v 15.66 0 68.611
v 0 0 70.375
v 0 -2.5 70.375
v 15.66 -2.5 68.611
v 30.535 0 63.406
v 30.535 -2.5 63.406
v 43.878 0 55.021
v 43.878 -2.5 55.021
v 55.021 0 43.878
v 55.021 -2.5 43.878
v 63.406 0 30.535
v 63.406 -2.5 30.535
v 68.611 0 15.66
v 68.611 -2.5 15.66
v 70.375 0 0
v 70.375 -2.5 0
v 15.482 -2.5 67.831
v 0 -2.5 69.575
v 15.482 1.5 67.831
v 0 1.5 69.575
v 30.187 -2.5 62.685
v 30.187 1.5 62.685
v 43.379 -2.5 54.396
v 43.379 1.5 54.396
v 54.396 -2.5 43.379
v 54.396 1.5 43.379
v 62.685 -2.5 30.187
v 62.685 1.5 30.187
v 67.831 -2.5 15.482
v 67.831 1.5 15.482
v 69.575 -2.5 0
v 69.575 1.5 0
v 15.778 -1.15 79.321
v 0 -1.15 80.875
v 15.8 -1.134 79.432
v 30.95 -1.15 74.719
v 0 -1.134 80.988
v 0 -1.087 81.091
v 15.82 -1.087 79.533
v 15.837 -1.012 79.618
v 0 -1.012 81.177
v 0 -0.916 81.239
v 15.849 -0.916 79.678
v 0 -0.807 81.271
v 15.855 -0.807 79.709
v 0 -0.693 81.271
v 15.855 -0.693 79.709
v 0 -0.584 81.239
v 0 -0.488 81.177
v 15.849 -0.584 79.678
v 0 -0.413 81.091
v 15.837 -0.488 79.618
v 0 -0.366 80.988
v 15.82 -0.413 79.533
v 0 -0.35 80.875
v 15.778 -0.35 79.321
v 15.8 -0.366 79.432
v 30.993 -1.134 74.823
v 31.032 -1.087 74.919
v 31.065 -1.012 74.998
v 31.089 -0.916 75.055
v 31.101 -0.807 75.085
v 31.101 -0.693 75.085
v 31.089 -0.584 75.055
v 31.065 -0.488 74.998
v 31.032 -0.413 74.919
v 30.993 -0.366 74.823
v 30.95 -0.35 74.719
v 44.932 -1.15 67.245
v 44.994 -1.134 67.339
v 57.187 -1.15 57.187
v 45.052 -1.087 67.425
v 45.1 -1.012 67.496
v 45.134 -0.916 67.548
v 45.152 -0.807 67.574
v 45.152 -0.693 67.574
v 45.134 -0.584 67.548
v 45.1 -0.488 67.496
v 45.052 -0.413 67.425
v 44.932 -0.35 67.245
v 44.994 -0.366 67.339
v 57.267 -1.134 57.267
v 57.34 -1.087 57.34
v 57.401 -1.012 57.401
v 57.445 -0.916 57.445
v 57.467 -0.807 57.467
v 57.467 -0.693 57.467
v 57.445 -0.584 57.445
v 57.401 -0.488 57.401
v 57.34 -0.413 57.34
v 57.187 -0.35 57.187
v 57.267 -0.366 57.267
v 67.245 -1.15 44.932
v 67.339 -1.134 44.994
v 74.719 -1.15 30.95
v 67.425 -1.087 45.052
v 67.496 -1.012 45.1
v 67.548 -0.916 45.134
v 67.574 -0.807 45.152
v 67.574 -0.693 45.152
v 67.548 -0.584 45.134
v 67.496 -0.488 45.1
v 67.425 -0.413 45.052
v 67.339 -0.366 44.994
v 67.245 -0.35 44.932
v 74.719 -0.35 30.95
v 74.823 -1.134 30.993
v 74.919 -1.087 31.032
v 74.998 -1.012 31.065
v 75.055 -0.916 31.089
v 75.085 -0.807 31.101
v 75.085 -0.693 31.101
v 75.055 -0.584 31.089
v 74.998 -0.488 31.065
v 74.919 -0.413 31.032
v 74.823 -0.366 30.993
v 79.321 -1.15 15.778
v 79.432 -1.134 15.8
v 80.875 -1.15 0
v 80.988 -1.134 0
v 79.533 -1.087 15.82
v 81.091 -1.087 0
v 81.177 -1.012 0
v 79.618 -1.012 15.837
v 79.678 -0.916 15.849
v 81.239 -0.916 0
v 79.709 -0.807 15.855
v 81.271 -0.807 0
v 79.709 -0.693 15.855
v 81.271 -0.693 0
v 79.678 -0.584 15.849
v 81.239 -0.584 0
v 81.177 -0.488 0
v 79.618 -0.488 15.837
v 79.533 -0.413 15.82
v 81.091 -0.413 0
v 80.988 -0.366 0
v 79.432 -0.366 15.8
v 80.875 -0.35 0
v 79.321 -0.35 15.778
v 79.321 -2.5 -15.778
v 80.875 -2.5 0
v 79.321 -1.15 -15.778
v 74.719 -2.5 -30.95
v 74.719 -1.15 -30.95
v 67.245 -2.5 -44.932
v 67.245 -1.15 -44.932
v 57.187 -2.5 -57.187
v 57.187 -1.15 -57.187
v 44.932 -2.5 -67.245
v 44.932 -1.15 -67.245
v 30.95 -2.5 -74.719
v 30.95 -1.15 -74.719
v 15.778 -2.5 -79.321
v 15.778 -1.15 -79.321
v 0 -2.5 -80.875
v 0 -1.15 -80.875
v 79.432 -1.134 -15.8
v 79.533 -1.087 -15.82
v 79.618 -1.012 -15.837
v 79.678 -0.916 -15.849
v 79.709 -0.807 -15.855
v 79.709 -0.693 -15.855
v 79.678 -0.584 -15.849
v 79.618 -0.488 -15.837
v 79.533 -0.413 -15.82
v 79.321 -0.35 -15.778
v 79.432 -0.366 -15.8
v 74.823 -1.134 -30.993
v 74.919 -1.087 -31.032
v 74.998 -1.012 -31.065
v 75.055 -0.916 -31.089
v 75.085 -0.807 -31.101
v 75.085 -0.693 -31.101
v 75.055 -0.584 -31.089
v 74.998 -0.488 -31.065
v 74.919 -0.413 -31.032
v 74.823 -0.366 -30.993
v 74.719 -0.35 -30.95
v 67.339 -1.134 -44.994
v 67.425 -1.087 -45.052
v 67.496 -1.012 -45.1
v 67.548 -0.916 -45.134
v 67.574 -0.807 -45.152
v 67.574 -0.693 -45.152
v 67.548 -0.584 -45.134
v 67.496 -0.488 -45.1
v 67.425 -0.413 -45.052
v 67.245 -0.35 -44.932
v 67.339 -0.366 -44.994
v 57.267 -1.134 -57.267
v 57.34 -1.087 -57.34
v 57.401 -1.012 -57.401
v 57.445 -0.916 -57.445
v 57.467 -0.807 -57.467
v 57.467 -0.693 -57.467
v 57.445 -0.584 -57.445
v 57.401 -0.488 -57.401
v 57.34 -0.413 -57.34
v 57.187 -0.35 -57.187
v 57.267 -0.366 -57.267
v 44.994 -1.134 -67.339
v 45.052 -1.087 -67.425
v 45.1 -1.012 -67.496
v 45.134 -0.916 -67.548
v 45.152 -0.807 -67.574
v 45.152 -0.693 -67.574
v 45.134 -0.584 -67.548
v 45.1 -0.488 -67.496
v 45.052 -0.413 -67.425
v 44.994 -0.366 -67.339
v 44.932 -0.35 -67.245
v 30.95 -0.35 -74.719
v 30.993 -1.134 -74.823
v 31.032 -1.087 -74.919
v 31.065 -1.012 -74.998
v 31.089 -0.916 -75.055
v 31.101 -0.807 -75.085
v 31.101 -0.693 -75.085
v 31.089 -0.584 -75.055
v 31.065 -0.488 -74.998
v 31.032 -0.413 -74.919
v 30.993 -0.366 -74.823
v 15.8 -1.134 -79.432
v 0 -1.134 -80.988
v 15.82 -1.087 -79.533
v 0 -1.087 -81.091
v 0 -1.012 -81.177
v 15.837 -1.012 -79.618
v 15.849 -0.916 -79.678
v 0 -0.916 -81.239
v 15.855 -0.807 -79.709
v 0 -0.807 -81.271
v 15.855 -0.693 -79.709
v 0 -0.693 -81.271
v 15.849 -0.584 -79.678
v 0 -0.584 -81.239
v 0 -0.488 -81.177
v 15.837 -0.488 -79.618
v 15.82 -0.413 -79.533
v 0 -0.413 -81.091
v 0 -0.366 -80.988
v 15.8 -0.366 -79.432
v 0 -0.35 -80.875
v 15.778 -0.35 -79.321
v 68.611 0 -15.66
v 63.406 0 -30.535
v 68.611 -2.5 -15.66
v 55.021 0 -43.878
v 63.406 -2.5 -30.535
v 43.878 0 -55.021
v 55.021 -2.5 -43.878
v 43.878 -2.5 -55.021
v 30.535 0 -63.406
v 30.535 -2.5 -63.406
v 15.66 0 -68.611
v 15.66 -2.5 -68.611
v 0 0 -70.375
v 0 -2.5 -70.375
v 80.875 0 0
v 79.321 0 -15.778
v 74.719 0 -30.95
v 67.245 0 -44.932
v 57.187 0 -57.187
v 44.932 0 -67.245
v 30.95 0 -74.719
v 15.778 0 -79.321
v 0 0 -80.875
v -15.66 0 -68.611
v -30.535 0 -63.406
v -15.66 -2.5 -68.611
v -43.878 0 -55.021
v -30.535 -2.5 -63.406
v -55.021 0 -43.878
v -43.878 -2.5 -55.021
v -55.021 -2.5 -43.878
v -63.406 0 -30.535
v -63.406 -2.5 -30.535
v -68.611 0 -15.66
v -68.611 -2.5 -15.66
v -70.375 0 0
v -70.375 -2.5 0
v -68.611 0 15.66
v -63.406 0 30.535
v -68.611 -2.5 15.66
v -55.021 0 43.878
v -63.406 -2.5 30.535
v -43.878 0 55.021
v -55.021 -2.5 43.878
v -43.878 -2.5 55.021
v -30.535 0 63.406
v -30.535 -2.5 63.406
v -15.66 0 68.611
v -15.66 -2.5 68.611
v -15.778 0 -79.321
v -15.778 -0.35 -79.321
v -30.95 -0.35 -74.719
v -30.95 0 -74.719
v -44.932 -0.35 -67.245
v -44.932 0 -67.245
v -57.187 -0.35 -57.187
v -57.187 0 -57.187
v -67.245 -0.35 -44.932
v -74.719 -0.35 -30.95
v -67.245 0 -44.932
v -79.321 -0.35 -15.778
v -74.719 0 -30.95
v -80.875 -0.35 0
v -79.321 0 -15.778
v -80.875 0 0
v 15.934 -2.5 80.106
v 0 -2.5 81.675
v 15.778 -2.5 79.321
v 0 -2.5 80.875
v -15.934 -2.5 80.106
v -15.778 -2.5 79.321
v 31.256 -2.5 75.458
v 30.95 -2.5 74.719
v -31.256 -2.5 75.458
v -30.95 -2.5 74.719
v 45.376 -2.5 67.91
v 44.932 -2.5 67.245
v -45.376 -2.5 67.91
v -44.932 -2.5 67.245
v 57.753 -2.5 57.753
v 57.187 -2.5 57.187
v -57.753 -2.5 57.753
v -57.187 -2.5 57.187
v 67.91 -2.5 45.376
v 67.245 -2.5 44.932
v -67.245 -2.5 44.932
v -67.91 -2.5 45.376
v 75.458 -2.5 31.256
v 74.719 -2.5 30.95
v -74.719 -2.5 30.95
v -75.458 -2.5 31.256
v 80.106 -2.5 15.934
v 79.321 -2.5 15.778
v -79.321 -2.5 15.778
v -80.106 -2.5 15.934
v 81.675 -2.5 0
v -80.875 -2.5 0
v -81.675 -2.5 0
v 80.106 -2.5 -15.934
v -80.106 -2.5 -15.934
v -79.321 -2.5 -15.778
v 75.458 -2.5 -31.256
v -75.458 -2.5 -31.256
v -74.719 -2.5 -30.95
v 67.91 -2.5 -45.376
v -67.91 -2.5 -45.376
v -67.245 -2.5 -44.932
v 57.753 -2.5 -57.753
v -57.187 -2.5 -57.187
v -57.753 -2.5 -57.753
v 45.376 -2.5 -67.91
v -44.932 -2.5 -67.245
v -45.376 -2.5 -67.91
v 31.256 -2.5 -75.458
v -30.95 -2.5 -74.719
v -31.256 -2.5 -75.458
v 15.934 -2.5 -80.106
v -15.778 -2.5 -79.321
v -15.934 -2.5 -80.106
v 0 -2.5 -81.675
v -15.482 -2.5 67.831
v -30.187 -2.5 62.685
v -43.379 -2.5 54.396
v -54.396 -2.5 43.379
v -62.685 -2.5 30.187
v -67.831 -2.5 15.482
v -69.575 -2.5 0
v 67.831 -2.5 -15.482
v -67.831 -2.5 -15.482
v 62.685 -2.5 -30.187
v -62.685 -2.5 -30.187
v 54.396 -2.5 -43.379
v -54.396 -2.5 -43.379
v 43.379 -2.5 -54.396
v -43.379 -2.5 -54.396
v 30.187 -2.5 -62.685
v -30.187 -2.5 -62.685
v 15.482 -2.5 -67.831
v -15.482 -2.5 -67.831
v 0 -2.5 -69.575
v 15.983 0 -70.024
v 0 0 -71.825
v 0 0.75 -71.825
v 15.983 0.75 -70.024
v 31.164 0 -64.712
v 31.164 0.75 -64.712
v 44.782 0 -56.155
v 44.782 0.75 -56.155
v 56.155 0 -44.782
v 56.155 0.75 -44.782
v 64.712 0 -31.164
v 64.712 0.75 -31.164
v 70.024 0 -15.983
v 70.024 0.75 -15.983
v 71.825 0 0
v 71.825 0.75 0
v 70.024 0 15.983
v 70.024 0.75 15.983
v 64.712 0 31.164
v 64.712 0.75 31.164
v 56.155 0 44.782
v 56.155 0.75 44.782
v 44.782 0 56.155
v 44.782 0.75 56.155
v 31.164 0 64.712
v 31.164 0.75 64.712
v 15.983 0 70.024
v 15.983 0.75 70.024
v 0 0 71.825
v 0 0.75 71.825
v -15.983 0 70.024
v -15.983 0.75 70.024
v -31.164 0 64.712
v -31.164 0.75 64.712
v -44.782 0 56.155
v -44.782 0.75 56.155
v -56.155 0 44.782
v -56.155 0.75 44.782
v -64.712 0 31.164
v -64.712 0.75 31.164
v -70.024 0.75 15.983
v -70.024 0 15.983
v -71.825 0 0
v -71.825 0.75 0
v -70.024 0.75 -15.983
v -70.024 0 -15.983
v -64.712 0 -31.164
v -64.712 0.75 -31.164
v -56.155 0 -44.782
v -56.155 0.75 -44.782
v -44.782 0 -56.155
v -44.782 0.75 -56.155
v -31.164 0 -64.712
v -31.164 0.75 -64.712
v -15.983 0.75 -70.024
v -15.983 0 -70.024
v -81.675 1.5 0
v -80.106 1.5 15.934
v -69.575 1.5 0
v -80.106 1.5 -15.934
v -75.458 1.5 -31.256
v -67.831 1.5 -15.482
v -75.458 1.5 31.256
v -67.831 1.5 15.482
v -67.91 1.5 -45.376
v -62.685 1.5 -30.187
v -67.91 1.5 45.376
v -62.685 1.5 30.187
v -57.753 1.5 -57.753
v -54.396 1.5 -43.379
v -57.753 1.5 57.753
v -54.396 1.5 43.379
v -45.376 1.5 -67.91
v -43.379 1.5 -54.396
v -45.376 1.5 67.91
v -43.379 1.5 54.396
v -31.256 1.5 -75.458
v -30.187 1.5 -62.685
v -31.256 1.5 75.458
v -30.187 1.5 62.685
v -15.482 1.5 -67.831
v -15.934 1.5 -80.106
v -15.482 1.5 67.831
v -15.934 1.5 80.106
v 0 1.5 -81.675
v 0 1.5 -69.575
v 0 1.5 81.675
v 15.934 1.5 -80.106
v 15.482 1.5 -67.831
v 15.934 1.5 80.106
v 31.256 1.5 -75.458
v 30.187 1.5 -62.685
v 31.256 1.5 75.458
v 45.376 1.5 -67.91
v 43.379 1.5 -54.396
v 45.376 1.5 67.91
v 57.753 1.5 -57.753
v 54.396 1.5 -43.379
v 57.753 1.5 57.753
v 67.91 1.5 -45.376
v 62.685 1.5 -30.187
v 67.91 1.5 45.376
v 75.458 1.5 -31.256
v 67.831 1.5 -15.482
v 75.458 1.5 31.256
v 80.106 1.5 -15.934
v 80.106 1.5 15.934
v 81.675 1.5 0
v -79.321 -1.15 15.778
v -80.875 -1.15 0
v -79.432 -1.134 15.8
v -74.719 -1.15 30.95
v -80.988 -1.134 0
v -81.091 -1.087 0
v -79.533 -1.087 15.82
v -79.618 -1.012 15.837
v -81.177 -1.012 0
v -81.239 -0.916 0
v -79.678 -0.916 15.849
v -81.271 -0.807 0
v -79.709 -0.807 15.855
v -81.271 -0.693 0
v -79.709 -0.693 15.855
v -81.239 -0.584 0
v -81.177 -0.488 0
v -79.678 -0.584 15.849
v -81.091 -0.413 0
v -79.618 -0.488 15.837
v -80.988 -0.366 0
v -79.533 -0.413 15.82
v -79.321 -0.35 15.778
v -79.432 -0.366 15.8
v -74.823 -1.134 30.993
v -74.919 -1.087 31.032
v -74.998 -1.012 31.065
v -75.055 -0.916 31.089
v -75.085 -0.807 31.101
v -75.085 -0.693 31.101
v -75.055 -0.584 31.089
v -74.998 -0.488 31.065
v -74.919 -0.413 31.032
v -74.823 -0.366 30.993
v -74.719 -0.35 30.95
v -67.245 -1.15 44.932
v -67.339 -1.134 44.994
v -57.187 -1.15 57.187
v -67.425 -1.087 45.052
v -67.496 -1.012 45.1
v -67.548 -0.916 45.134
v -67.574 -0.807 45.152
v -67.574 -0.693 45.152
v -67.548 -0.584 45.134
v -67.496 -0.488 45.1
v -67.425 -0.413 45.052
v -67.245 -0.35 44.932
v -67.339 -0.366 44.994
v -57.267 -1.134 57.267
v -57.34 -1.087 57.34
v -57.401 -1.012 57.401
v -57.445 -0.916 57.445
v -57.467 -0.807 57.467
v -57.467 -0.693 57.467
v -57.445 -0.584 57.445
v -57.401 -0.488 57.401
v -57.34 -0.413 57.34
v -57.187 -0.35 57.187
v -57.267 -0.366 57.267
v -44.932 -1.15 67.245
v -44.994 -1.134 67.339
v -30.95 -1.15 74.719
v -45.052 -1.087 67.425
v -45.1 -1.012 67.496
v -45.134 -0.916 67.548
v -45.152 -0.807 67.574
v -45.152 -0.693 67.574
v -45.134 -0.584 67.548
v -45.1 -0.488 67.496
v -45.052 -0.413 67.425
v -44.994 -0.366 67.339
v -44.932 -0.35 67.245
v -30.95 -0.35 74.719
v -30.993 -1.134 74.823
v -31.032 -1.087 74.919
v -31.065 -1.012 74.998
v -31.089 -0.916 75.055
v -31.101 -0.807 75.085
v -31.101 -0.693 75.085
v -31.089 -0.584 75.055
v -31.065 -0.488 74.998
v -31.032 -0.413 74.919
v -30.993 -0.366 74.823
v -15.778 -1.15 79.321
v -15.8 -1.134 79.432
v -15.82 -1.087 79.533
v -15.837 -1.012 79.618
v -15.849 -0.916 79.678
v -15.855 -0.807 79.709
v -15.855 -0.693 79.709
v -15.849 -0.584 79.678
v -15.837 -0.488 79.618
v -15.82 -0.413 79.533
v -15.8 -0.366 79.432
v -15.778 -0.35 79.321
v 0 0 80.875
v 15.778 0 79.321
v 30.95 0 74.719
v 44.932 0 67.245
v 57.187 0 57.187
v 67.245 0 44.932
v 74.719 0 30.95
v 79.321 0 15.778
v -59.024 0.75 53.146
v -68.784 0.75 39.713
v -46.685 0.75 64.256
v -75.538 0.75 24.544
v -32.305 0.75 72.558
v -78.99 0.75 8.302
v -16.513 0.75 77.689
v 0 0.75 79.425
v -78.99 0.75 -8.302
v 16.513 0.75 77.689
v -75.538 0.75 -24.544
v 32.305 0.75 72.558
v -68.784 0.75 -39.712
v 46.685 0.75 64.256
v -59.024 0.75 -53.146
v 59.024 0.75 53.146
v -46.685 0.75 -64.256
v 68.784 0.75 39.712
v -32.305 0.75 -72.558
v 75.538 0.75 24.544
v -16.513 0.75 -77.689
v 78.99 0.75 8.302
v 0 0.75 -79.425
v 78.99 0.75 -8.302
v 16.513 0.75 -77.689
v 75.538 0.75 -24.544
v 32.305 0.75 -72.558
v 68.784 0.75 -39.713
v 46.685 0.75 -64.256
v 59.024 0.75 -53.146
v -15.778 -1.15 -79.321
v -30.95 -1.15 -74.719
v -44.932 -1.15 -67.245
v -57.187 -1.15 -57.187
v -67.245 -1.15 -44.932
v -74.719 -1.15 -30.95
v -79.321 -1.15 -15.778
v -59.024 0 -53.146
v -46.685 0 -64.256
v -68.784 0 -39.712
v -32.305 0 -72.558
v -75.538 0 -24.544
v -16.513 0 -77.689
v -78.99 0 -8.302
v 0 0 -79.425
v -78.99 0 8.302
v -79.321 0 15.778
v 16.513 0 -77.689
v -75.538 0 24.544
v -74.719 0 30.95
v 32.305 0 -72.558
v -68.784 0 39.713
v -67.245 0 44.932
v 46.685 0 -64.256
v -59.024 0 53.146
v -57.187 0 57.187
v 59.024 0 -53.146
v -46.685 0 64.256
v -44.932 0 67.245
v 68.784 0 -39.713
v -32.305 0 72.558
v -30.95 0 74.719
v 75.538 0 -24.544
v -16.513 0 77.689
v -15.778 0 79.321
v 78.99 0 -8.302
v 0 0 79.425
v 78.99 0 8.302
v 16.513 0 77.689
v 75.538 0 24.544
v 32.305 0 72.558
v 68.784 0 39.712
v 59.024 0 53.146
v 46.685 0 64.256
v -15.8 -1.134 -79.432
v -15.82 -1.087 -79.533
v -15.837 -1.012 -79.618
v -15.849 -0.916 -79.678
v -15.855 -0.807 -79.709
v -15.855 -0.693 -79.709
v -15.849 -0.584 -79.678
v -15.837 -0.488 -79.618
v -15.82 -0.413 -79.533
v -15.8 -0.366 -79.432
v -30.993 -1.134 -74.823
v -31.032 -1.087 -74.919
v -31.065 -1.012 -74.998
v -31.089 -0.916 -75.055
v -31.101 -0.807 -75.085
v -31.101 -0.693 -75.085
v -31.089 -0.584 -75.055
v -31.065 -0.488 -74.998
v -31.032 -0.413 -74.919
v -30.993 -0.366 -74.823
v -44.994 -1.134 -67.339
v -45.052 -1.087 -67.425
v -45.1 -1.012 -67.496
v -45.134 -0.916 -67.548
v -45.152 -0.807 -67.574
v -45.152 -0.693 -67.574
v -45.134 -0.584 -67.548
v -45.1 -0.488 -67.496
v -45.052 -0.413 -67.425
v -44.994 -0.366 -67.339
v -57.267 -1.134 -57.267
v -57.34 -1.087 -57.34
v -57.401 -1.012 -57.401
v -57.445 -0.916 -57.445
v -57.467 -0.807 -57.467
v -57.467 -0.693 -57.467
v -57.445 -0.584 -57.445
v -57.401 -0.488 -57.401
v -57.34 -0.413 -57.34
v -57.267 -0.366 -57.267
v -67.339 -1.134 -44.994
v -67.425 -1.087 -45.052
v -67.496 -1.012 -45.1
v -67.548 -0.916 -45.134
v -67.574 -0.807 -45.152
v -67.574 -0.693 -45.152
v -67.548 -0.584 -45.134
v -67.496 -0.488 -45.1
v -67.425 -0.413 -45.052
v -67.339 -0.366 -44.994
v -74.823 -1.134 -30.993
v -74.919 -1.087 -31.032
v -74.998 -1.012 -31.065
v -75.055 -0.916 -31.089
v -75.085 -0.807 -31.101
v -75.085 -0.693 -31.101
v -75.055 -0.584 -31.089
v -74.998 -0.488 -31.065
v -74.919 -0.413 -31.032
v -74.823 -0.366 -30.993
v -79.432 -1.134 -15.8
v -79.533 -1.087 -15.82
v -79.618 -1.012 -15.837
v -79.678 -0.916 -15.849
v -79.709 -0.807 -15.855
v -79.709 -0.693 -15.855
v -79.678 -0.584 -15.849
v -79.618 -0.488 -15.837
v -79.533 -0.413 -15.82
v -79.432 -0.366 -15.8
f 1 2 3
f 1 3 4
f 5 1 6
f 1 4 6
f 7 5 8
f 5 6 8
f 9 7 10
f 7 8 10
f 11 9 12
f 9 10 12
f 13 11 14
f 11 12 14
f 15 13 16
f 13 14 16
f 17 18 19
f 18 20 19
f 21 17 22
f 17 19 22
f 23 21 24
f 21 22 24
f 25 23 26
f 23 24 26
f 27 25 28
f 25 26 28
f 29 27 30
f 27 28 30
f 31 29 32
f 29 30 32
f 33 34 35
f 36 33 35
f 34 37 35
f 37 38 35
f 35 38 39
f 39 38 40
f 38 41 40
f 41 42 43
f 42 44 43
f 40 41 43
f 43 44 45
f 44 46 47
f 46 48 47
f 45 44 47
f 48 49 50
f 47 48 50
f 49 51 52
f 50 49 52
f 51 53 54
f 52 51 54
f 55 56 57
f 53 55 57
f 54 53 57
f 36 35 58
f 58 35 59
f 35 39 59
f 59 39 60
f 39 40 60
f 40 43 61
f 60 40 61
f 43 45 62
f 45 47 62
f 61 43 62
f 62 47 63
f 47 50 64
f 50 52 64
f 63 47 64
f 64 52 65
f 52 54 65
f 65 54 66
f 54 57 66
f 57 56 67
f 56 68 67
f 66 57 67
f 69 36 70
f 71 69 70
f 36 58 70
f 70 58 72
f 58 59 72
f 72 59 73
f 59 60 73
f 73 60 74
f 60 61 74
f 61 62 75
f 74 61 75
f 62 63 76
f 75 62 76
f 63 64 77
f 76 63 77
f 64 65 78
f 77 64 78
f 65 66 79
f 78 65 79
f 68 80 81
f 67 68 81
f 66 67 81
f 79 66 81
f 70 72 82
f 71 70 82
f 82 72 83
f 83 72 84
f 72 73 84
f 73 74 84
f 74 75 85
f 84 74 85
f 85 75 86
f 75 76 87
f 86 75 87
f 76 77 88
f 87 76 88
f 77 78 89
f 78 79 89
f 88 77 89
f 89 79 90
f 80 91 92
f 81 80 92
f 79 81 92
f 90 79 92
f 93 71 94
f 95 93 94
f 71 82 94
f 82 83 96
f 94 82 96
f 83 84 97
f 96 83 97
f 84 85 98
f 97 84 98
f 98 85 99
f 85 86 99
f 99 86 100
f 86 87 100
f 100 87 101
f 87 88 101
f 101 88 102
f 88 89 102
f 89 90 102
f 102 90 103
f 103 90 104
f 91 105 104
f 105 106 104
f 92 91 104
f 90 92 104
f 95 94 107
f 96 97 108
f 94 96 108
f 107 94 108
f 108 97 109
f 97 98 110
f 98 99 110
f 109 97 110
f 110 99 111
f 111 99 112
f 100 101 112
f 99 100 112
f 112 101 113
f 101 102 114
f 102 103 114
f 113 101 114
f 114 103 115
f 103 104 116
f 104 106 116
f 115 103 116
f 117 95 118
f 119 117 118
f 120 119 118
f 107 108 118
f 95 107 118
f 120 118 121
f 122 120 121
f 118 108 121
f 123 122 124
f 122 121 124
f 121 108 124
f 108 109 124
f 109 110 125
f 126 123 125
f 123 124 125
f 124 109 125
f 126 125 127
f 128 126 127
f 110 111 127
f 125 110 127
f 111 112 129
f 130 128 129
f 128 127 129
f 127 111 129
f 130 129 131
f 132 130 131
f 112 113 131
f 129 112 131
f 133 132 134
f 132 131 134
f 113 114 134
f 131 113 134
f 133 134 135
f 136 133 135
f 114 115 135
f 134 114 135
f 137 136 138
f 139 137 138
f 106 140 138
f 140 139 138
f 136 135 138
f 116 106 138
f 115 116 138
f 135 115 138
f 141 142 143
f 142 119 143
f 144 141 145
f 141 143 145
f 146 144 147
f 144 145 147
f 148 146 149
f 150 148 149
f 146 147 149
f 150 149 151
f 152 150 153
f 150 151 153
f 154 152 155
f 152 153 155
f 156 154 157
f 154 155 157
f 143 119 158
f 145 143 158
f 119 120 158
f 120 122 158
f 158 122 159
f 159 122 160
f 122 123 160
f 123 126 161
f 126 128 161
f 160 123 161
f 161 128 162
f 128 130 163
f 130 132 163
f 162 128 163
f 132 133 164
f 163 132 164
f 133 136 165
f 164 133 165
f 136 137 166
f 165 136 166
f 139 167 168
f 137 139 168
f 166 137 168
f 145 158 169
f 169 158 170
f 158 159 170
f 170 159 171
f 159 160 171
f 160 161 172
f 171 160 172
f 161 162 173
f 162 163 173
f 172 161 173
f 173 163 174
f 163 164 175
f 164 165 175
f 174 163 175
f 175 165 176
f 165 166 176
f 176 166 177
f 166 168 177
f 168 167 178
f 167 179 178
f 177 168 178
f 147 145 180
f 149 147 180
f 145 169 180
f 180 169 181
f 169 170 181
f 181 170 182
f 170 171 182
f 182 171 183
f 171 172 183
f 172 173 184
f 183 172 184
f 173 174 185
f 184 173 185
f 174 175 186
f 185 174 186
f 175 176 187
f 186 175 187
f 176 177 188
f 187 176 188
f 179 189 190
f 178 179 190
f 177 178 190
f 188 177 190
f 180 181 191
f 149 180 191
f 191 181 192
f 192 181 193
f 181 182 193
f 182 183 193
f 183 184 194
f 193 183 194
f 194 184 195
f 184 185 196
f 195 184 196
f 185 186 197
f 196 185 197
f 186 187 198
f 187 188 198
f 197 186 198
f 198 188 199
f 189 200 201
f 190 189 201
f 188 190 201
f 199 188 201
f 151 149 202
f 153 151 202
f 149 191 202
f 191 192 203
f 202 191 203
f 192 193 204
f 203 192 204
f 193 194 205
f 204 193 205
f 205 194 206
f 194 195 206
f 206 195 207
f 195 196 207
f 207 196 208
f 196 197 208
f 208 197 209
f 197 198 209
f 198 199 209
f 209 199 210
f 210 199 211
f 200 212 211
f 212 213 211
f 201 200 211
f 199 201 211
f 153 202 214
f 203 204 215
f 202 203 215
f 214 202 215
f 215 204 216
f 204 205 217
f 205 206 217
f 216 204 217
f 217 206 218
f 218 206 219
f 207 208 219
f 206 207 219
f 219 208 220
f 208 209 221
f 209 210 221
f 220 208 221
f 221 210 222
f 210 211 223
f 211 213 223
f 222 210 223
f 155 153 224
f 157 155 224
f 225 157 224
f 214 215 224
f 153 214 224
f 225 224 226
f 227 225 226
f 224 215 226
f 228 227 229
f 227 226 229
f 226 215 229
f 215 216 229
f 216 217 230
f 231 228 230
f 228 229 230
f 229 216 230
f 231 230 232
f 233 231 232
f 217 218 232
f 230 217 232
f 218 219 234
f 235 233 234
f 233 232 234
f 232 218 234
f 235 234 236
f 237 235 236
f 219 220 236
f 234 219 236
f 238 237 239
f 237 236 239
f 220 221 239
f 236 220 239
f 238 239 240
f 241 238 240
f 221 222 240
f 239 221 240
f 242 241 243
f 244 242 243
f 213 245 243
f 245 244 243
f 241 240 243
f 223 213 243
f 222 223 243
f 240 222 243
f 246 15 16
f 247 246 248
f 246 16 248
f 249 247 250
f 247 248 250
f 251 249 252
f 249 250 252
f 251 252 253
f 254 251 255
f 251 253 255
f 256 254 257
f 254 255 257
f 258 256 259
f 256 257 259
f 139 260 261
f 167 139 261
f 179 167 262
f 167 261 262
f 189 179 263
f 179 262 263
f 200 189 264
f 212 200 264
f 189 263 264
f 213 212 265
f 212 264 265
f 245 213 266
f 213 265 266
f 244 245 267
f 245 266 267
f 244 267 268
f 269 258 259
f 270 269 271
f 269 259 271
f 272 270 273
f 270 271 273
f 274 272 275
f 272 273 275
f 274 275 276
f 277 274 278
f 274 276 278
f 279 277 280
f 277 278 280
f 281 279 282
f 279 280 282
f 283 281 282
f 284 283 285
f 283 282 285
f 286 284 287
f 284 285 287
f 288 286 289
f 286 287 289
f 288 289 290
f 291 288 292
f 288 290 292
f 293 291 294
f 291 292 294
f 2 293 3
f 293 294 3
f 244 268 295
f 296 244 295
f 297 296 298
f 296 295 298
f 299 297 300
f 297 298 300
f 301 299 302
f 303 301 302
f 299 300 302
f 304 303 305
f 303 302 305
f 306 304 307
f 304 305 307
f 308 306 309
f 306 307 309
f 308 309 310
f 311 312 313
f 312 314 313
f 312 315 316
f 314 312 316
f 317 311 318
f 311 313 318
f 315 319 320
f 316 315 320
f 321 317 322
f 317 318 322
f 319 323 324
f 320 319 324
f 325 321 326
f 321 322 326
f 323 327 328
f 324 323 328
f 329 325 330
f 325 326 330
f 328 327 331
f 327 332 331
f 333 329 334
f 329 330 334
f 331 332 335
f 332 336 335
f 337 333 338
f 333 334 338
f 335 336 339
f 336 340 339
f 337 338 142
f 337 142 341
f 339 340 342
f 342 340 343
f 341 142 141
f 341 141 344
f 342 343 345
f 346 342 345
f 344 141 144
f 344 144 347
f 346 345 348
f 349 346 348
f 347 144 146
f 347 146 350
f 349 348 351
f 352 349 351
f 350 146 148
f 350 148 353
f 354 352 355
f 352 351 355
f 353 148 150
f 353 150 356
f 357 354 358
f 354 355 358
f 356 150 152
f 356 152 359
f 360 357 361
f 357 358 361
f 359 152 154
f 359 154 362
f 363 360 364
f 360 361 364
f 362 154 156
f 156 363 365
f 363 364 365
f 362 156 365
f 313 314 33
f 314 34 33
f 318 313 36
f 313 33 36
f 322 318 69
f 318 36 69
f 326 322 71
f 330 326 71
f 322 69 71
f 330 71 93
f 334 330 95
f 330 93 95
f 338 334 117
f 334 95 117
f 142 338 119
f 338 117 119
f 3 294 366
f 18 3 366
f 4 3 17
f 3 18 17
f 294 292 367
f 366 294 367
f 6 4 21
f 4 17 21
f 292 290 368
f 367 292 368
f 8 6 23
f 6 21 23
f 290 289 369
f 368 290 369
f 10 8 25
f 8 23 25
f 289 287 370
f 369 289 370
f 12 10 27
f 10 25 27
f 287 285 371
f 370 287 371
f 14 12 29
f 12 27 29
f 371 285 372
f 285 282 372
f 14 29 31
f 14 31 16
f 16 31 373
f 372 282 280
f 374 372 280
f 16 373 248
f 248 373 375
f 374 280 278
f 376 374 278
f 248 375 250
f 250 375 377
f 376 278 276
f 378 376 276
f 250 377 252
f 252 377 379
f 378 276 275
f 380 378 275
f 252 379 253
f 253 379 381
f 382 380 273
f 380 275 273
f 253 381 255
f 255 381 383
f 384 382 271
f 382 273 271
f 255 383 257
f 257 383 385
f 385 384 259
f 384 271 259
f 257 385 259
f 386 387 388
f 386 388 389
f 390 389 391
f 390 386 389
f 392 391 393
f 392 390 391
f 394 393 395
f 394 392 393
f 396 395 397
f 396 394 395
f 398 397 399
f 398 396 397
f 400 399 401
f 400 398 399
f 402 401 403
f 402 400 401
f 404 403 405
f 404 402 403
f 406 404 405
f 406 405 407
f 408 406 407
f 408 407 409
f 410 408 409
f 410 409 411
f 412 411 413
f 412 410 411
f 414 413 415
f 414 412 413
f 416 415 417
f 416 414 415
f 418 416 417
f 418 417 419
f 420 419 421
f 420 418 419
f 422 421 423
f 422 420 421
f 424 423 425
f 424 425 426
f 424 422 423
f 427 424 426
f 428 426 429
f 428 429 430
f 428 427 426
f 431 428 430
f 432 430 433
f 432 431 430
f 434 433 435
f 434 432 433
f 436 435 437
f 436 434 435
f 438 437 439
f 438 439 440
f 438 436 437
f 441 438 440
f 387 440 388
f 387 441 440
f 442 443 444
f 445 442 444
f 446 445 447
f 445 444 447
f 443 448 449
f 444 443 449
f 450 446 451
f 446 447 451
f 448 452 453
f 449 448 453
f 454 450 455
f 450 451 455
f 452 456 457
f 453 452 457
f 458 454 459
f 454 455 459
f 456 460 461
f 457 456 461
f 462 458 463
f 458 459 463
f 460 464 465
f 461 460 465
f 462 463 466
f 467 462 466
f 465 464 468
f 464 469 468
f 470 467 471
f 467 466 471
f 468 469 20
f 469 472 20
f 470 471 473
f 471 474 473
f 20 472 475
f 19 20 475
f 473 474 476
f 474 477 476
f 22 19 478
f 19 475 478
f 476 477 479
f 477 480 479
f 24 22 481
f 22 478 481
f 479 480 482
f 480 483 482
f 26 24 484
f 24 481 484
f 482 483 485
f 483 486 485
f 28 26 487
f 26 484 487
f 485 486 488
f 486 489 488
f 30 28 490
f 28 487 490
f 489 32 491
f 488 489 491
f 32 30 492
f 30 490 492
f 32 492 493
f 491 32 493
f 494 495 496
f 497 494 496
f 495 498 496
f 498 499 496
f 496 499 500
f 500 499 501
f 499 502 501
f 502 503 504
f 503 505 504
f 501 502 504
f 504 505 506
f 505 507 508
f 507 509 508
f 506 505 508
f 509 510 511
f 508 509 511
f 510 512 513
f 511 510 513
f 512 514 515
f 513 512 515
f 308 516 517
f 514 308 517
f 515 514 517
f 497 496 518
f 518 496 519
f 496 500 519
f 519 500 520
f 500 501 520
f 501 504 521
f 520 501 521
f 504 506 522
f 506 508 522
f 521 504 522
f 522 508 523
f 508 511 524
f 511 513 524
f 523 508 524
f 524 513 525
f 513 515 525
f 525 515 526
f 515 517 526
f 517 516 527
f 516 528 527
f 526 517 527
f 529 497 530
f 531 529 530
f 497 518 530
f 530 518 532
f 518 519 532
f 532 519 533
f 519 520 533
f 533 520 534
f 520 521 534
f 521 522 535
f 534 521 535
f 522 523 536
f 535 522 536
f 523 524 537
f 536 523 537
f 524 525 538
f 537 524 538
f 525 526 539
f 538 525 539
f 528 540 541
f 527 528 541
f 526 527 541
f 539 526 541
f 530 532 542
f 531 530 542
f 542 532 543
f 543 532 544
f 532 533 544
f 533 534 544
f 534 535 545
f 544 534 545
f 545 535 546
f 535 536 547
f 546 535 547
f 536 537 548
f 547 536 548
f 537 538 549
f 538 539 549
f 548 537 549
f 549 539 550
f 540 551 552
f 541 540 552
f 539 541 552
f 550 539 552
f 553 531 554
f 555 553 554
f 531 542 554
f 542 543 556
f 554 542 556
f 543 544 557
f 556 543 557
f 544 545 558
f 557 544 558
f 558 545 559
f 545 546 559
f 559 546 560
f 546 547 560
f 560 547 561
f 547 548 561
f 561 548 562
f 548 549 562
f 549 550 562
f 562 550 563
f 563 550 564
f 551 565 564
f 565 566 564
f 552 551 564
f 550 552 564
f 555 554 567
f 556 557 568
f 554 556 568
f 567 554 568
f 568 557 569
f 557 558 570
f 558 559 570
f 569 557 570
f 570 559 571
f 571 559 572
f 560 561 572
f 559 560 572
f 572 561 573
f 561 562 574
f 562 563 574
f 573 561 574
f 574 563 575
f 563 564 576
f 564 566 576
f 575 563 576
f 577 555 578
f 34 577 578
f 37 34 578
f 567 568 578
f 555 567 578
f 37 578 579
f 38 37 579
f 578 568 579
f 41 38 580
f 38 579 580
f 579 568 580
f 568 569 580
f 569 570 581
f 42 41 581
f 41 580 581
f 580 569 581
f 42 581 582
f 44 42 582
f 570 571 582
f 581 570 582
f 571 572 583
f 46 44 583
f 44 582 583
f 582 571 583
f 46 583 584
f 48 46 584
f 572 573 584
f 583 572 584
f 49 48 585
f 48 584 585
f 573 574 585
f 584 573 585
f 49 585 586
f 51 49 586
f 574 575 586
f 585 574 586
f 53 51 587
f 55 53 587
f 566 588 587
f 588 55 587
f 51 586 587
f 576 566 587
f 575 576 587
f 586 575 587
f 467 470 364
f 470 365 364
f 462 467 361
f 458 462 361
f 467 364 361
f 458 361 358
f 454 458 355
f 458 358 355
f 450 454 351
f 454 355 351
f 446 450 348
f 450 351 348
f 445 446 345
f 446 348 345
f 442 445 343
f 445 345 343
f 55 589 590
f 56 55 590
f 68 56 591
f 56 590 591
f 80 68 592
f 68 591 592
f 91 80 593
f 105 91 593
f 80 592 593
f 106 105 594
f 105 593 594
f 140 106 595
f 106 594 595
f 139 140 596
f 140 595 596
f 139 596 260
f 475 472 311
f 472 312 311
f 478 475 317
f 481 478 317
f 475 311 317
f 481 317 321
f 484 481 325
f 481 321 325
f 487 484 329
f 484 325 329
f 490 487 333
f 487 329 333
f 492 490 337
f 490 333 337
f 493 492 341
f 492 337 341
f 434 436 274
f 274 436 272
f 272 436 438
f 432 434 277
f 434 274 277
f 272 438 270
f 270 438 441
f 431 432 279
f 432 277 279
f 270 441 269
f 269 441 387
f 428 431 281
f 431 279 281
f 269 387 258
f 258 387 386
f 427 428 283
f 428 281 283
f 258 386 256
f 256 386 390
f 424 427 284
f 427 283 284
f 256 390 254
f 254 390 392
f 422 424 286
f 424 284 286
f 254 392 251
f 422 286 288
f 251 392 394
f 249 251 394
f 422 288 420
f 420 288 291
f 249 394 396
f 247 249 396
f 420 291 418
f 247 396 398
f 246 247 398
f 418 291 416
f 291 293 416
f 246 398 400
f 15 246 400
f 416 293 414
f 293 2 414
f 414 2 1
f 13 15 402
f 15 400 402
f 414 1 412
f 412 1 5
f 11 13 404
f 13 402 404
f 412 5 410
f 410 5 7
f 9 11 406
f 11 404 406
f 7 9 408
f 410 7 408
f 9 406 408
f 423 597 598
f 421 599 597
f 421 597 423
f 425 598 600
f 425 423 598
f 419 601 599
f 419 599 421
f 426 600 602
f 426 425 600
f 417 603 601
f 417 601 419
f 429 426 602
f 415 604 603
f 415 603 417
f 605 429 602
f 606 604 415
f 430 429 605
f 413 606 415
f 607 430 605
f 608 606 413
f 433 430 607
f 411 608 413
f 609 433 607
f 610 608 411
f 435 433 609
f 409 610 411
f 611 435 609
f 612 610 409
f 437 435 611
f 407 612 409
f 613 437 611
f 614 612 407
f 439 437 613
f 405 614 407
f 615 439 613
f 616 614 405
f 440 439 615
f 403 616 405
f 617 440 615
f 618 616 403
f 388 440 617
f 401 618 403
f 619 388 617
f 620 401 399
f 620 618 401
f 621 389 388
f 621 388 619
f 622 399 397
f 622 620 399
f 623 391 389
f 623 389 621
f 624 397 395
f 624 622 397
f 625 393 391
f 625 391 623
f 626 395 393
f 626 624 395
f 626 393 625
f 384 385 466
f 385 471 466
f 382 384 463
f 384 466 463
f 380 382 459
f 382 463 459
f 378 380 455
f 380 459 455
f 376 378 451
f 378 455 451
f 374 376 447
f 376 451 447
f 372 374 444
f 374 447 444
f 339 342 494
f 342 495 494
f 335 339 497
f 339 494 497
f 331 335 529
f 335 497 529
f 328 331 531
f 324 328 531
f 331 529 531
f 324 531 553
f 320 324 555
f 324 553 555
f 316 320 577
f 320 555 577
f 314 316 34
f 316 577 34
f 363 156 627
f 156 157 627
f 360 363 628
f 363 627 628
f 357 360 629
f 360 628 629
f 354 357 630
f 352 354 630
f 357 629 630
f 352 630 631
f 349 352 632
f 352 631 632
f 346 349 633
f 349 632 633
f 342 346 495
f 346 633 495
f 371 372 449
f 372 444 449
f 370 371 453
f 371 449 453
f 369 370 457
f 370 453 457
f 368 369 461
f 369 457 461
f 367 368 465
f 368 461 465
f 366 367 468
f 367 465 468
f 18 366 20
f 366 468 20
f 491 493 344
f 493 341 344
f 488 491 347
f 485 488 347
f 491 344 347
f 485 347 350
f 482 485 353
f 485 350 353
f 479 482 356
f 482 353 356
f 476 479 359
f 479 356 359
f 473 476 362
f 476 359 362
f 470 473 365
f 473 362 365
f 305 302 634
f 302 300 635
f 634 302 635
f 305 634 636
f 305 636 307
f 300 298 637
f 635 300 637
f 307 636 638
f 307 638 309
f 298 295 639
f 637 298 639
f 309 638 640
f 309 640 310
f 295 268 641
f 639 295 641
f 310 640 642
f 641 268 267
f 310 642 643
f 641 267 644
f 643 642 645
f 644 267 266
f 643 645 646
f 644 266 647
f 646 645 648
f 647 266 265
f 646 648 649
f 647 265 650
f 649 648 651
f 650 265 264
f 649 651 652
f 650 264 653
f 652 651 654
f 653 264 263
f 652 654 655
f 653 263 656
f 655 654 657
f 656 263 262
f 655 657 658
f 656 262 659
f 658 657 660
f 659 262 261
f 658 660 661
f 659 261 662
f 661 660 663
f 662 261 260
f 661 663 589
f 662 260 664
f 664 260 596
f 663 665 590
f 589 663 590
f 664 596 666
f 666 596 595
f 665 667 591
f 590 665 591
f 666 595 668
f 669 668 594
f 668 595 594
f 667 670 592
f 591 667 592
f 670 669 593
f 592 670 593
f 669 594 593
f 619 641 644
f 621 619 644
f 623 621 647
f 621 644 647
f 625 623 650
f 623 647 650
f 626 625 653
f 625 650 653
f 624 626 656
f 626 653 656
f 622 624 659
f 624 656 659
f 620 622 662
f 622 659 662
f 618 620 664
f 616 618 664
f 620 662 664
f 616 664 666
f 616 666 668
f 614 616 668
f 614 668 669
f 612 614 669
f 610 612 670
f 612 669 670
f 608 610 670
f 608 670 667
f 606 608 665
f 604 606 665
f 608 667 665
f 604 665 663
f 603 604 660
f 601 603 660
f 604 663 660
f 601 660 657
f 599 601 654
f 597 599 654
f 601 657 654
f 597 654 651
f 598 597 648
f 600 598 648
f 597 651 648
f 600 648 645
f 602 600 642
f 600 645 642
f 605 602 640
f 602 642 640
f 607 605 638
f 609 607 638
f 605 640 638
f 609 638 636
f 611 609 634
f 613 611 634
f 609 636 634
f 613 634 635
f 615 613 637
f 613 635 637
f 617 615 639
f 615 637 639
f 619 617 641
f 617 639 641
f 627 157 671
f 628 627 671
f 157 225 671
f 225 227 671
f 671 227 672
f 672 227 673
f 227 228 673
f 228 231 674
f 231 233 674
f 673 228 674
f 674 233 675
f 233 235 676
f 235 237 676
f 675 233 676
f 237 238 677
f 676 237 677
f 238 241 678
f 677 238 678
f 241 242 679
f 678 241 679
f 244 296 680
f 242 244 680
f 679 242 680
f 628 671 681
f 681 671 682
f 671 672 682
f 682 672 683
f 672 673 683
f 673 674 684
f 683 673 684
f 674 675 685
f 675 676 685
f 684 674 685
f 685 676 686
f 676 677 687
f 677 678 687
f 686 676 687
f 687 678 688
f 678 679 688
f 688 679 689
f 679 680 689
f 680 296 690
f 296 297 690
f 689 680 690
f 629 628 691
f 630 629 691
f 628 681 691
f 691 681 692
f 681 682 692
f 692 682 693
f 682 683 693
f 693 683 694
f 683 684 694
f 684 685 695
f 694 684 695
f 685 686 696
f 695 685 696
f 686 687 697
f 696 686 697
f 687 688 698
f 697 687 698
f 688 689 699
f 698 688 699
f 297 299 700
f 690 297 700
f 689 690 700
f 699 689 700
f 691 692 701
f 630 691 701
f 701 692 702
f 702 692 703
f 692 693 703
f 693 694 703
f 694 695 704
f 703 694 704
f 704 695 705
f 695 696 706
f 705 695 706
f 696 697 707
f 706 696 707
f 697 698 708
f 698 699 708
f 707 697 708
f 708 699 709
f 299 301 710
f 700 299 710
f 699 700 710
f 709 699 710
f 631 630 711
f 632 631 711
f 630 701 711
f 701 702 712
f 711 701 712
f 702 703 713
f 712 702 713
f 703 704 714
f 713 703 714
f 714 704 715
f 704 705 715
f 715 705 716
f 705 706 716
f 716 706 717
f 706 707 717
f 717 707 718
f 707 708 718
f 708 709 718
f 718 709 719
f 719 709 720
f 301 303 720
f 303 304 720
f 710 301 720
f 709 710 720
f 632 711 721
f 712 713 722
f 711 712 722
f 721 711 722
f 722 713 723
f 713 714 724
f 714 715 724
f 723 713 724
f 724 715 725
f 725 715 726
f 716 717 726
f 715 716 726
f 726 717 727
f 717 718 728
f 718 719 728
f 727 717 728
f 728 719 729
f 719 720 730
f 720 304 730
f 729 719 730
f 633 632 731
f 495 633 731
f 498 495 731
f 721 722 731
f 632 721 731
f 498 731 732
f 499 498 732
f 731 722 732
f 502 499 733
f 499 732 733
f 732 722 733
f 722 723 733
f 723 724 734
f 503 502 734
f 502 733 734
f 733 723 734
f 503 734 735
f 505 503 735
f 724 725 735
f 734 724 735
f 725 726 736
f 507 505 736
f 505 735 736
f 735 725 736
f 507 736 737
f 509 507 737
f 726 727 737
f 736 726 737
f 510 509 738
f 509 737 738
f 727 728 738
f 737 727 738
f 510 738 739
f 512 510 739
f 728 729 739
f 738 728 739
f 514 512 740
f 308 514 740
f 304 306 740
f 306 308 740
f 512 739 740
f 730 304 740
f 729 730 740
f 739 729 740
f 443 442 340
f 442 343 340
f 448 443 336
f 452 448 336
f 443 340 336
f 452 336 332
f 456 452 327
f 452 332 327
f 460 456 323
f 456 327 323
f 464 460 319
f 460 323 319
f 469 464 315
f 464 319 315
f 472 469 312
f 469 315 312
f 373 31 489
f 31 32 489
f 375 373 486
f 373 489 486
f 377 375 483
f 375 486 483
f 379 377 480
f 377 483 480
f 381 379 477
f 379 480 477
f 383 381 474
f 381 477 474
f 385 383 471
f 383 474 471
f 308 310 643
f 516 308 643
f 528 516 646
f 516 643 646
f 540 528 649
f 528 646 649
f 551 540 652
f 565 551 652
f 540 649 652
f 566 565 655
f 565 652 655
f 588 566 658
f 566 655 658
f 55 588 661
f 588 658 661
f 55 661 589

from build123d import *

# Parameters (mm, degrees)
RING_BASE_PROFILE_R        = 80.875
RING_BASE_PROFILE_R_2      = 70.375
RING_BASE_EXTRUSTION_DEPTH = 1.5
RING_LIP_PROFILE_W         = 0.8
RING_LIP_PROFILE_H         = 4
LED_CHANNEL_PROFILE_R      = 79.425
LED_CHANNEL_PROFILE_R_2    = 71.825
LED_CHANNEL_CUT_DEPTH      = 0.75


with BuildPart() as part:
    # Ring Base Profile → Ring Base Extrustion (new body)
    with BuildSketch(Plane(origin=(0, 0, 0), x_dir=(1, 0, 0), z_dir=(0, 1, 0))):
        with Locations(Location((0, 0, 0), (0, 0, 270))):
            Circle(RING_BASE_PROFILE_R)
        with Locations(Location((0, 0, 0), (0, 0, 270))):
            Circle(RING_BASE_PROFILE_R_2, mode=Mode.SUBTRACT)
    extrude(amount=RING_BASE_EXTRUSTION_DEPTH)

    # Ring Lip: sweep along a curve in space
    with BuildLine() as ring_lip_path:
        ThreePointArc((0, 1.5, 80.875), (57.187260928, 1.5, 57.187260928), (80.875, 1.5, 0))
        ThreePointArc((80.875, 1.5, 0), (57.187260928, 1.5, -57.187260928), (0, 1.5, -80.875))
        ThreePointArc((0, 1.5, -80.875), (-57.187260928, 1.5, -57.187260928), (-80.875, 1.5, 0))
        ThreePointArc((-80.875, 1.5, 0), (-57.187260928, 1.5, 57.187260928), (0, 1.5, 80.875))
    # Ring Lip Profile → Ring Lip (sweep)
    with BuildSketch(Plane.XY):
        with BuildLine():
            Line((-80.875, 1.5), (-80.875, -0.35))
            ThreePointArc((-80.875, -0.35), (-81.275, -0.75), (-80.875, -1.15))
            Line((-80.875, -1.15), (-80.875, -2.5))
            Line((-80.875, -2.5), (-81.675, -2.5))
            Line((-81.675, -2.5), (-81.675, 1.5))
            Line((-81.675, 1.5), (-80.875, 1.5))
        make_face()
        with Locations((-69.975, -0.5)):
            Rectangle(RING_LIP_PROFILE_W, RING_LIP_PROFILE_H)
    sweep(path=ring_lip_path.line)

    # LED Channel Profile → LED Channel Cut (cut)
    with BuildSketch(Plane.XZ):
        with Locations(Location((0, 0, 0), (0, 0, 270))):
            Circle(LED_CHANNEL_PROFILE_R)
        with Locations(Location((0, 0, 0), (0, 0, 270))):
            Circle(LED_CHANNEL_PROFILE_R_2, mode=Mode.SUBTRACT)
    extrude(amount=-LED_CHANNEL_CUT_DEPTH, mode=Mode.SUBTRACT)


solid = part.part
